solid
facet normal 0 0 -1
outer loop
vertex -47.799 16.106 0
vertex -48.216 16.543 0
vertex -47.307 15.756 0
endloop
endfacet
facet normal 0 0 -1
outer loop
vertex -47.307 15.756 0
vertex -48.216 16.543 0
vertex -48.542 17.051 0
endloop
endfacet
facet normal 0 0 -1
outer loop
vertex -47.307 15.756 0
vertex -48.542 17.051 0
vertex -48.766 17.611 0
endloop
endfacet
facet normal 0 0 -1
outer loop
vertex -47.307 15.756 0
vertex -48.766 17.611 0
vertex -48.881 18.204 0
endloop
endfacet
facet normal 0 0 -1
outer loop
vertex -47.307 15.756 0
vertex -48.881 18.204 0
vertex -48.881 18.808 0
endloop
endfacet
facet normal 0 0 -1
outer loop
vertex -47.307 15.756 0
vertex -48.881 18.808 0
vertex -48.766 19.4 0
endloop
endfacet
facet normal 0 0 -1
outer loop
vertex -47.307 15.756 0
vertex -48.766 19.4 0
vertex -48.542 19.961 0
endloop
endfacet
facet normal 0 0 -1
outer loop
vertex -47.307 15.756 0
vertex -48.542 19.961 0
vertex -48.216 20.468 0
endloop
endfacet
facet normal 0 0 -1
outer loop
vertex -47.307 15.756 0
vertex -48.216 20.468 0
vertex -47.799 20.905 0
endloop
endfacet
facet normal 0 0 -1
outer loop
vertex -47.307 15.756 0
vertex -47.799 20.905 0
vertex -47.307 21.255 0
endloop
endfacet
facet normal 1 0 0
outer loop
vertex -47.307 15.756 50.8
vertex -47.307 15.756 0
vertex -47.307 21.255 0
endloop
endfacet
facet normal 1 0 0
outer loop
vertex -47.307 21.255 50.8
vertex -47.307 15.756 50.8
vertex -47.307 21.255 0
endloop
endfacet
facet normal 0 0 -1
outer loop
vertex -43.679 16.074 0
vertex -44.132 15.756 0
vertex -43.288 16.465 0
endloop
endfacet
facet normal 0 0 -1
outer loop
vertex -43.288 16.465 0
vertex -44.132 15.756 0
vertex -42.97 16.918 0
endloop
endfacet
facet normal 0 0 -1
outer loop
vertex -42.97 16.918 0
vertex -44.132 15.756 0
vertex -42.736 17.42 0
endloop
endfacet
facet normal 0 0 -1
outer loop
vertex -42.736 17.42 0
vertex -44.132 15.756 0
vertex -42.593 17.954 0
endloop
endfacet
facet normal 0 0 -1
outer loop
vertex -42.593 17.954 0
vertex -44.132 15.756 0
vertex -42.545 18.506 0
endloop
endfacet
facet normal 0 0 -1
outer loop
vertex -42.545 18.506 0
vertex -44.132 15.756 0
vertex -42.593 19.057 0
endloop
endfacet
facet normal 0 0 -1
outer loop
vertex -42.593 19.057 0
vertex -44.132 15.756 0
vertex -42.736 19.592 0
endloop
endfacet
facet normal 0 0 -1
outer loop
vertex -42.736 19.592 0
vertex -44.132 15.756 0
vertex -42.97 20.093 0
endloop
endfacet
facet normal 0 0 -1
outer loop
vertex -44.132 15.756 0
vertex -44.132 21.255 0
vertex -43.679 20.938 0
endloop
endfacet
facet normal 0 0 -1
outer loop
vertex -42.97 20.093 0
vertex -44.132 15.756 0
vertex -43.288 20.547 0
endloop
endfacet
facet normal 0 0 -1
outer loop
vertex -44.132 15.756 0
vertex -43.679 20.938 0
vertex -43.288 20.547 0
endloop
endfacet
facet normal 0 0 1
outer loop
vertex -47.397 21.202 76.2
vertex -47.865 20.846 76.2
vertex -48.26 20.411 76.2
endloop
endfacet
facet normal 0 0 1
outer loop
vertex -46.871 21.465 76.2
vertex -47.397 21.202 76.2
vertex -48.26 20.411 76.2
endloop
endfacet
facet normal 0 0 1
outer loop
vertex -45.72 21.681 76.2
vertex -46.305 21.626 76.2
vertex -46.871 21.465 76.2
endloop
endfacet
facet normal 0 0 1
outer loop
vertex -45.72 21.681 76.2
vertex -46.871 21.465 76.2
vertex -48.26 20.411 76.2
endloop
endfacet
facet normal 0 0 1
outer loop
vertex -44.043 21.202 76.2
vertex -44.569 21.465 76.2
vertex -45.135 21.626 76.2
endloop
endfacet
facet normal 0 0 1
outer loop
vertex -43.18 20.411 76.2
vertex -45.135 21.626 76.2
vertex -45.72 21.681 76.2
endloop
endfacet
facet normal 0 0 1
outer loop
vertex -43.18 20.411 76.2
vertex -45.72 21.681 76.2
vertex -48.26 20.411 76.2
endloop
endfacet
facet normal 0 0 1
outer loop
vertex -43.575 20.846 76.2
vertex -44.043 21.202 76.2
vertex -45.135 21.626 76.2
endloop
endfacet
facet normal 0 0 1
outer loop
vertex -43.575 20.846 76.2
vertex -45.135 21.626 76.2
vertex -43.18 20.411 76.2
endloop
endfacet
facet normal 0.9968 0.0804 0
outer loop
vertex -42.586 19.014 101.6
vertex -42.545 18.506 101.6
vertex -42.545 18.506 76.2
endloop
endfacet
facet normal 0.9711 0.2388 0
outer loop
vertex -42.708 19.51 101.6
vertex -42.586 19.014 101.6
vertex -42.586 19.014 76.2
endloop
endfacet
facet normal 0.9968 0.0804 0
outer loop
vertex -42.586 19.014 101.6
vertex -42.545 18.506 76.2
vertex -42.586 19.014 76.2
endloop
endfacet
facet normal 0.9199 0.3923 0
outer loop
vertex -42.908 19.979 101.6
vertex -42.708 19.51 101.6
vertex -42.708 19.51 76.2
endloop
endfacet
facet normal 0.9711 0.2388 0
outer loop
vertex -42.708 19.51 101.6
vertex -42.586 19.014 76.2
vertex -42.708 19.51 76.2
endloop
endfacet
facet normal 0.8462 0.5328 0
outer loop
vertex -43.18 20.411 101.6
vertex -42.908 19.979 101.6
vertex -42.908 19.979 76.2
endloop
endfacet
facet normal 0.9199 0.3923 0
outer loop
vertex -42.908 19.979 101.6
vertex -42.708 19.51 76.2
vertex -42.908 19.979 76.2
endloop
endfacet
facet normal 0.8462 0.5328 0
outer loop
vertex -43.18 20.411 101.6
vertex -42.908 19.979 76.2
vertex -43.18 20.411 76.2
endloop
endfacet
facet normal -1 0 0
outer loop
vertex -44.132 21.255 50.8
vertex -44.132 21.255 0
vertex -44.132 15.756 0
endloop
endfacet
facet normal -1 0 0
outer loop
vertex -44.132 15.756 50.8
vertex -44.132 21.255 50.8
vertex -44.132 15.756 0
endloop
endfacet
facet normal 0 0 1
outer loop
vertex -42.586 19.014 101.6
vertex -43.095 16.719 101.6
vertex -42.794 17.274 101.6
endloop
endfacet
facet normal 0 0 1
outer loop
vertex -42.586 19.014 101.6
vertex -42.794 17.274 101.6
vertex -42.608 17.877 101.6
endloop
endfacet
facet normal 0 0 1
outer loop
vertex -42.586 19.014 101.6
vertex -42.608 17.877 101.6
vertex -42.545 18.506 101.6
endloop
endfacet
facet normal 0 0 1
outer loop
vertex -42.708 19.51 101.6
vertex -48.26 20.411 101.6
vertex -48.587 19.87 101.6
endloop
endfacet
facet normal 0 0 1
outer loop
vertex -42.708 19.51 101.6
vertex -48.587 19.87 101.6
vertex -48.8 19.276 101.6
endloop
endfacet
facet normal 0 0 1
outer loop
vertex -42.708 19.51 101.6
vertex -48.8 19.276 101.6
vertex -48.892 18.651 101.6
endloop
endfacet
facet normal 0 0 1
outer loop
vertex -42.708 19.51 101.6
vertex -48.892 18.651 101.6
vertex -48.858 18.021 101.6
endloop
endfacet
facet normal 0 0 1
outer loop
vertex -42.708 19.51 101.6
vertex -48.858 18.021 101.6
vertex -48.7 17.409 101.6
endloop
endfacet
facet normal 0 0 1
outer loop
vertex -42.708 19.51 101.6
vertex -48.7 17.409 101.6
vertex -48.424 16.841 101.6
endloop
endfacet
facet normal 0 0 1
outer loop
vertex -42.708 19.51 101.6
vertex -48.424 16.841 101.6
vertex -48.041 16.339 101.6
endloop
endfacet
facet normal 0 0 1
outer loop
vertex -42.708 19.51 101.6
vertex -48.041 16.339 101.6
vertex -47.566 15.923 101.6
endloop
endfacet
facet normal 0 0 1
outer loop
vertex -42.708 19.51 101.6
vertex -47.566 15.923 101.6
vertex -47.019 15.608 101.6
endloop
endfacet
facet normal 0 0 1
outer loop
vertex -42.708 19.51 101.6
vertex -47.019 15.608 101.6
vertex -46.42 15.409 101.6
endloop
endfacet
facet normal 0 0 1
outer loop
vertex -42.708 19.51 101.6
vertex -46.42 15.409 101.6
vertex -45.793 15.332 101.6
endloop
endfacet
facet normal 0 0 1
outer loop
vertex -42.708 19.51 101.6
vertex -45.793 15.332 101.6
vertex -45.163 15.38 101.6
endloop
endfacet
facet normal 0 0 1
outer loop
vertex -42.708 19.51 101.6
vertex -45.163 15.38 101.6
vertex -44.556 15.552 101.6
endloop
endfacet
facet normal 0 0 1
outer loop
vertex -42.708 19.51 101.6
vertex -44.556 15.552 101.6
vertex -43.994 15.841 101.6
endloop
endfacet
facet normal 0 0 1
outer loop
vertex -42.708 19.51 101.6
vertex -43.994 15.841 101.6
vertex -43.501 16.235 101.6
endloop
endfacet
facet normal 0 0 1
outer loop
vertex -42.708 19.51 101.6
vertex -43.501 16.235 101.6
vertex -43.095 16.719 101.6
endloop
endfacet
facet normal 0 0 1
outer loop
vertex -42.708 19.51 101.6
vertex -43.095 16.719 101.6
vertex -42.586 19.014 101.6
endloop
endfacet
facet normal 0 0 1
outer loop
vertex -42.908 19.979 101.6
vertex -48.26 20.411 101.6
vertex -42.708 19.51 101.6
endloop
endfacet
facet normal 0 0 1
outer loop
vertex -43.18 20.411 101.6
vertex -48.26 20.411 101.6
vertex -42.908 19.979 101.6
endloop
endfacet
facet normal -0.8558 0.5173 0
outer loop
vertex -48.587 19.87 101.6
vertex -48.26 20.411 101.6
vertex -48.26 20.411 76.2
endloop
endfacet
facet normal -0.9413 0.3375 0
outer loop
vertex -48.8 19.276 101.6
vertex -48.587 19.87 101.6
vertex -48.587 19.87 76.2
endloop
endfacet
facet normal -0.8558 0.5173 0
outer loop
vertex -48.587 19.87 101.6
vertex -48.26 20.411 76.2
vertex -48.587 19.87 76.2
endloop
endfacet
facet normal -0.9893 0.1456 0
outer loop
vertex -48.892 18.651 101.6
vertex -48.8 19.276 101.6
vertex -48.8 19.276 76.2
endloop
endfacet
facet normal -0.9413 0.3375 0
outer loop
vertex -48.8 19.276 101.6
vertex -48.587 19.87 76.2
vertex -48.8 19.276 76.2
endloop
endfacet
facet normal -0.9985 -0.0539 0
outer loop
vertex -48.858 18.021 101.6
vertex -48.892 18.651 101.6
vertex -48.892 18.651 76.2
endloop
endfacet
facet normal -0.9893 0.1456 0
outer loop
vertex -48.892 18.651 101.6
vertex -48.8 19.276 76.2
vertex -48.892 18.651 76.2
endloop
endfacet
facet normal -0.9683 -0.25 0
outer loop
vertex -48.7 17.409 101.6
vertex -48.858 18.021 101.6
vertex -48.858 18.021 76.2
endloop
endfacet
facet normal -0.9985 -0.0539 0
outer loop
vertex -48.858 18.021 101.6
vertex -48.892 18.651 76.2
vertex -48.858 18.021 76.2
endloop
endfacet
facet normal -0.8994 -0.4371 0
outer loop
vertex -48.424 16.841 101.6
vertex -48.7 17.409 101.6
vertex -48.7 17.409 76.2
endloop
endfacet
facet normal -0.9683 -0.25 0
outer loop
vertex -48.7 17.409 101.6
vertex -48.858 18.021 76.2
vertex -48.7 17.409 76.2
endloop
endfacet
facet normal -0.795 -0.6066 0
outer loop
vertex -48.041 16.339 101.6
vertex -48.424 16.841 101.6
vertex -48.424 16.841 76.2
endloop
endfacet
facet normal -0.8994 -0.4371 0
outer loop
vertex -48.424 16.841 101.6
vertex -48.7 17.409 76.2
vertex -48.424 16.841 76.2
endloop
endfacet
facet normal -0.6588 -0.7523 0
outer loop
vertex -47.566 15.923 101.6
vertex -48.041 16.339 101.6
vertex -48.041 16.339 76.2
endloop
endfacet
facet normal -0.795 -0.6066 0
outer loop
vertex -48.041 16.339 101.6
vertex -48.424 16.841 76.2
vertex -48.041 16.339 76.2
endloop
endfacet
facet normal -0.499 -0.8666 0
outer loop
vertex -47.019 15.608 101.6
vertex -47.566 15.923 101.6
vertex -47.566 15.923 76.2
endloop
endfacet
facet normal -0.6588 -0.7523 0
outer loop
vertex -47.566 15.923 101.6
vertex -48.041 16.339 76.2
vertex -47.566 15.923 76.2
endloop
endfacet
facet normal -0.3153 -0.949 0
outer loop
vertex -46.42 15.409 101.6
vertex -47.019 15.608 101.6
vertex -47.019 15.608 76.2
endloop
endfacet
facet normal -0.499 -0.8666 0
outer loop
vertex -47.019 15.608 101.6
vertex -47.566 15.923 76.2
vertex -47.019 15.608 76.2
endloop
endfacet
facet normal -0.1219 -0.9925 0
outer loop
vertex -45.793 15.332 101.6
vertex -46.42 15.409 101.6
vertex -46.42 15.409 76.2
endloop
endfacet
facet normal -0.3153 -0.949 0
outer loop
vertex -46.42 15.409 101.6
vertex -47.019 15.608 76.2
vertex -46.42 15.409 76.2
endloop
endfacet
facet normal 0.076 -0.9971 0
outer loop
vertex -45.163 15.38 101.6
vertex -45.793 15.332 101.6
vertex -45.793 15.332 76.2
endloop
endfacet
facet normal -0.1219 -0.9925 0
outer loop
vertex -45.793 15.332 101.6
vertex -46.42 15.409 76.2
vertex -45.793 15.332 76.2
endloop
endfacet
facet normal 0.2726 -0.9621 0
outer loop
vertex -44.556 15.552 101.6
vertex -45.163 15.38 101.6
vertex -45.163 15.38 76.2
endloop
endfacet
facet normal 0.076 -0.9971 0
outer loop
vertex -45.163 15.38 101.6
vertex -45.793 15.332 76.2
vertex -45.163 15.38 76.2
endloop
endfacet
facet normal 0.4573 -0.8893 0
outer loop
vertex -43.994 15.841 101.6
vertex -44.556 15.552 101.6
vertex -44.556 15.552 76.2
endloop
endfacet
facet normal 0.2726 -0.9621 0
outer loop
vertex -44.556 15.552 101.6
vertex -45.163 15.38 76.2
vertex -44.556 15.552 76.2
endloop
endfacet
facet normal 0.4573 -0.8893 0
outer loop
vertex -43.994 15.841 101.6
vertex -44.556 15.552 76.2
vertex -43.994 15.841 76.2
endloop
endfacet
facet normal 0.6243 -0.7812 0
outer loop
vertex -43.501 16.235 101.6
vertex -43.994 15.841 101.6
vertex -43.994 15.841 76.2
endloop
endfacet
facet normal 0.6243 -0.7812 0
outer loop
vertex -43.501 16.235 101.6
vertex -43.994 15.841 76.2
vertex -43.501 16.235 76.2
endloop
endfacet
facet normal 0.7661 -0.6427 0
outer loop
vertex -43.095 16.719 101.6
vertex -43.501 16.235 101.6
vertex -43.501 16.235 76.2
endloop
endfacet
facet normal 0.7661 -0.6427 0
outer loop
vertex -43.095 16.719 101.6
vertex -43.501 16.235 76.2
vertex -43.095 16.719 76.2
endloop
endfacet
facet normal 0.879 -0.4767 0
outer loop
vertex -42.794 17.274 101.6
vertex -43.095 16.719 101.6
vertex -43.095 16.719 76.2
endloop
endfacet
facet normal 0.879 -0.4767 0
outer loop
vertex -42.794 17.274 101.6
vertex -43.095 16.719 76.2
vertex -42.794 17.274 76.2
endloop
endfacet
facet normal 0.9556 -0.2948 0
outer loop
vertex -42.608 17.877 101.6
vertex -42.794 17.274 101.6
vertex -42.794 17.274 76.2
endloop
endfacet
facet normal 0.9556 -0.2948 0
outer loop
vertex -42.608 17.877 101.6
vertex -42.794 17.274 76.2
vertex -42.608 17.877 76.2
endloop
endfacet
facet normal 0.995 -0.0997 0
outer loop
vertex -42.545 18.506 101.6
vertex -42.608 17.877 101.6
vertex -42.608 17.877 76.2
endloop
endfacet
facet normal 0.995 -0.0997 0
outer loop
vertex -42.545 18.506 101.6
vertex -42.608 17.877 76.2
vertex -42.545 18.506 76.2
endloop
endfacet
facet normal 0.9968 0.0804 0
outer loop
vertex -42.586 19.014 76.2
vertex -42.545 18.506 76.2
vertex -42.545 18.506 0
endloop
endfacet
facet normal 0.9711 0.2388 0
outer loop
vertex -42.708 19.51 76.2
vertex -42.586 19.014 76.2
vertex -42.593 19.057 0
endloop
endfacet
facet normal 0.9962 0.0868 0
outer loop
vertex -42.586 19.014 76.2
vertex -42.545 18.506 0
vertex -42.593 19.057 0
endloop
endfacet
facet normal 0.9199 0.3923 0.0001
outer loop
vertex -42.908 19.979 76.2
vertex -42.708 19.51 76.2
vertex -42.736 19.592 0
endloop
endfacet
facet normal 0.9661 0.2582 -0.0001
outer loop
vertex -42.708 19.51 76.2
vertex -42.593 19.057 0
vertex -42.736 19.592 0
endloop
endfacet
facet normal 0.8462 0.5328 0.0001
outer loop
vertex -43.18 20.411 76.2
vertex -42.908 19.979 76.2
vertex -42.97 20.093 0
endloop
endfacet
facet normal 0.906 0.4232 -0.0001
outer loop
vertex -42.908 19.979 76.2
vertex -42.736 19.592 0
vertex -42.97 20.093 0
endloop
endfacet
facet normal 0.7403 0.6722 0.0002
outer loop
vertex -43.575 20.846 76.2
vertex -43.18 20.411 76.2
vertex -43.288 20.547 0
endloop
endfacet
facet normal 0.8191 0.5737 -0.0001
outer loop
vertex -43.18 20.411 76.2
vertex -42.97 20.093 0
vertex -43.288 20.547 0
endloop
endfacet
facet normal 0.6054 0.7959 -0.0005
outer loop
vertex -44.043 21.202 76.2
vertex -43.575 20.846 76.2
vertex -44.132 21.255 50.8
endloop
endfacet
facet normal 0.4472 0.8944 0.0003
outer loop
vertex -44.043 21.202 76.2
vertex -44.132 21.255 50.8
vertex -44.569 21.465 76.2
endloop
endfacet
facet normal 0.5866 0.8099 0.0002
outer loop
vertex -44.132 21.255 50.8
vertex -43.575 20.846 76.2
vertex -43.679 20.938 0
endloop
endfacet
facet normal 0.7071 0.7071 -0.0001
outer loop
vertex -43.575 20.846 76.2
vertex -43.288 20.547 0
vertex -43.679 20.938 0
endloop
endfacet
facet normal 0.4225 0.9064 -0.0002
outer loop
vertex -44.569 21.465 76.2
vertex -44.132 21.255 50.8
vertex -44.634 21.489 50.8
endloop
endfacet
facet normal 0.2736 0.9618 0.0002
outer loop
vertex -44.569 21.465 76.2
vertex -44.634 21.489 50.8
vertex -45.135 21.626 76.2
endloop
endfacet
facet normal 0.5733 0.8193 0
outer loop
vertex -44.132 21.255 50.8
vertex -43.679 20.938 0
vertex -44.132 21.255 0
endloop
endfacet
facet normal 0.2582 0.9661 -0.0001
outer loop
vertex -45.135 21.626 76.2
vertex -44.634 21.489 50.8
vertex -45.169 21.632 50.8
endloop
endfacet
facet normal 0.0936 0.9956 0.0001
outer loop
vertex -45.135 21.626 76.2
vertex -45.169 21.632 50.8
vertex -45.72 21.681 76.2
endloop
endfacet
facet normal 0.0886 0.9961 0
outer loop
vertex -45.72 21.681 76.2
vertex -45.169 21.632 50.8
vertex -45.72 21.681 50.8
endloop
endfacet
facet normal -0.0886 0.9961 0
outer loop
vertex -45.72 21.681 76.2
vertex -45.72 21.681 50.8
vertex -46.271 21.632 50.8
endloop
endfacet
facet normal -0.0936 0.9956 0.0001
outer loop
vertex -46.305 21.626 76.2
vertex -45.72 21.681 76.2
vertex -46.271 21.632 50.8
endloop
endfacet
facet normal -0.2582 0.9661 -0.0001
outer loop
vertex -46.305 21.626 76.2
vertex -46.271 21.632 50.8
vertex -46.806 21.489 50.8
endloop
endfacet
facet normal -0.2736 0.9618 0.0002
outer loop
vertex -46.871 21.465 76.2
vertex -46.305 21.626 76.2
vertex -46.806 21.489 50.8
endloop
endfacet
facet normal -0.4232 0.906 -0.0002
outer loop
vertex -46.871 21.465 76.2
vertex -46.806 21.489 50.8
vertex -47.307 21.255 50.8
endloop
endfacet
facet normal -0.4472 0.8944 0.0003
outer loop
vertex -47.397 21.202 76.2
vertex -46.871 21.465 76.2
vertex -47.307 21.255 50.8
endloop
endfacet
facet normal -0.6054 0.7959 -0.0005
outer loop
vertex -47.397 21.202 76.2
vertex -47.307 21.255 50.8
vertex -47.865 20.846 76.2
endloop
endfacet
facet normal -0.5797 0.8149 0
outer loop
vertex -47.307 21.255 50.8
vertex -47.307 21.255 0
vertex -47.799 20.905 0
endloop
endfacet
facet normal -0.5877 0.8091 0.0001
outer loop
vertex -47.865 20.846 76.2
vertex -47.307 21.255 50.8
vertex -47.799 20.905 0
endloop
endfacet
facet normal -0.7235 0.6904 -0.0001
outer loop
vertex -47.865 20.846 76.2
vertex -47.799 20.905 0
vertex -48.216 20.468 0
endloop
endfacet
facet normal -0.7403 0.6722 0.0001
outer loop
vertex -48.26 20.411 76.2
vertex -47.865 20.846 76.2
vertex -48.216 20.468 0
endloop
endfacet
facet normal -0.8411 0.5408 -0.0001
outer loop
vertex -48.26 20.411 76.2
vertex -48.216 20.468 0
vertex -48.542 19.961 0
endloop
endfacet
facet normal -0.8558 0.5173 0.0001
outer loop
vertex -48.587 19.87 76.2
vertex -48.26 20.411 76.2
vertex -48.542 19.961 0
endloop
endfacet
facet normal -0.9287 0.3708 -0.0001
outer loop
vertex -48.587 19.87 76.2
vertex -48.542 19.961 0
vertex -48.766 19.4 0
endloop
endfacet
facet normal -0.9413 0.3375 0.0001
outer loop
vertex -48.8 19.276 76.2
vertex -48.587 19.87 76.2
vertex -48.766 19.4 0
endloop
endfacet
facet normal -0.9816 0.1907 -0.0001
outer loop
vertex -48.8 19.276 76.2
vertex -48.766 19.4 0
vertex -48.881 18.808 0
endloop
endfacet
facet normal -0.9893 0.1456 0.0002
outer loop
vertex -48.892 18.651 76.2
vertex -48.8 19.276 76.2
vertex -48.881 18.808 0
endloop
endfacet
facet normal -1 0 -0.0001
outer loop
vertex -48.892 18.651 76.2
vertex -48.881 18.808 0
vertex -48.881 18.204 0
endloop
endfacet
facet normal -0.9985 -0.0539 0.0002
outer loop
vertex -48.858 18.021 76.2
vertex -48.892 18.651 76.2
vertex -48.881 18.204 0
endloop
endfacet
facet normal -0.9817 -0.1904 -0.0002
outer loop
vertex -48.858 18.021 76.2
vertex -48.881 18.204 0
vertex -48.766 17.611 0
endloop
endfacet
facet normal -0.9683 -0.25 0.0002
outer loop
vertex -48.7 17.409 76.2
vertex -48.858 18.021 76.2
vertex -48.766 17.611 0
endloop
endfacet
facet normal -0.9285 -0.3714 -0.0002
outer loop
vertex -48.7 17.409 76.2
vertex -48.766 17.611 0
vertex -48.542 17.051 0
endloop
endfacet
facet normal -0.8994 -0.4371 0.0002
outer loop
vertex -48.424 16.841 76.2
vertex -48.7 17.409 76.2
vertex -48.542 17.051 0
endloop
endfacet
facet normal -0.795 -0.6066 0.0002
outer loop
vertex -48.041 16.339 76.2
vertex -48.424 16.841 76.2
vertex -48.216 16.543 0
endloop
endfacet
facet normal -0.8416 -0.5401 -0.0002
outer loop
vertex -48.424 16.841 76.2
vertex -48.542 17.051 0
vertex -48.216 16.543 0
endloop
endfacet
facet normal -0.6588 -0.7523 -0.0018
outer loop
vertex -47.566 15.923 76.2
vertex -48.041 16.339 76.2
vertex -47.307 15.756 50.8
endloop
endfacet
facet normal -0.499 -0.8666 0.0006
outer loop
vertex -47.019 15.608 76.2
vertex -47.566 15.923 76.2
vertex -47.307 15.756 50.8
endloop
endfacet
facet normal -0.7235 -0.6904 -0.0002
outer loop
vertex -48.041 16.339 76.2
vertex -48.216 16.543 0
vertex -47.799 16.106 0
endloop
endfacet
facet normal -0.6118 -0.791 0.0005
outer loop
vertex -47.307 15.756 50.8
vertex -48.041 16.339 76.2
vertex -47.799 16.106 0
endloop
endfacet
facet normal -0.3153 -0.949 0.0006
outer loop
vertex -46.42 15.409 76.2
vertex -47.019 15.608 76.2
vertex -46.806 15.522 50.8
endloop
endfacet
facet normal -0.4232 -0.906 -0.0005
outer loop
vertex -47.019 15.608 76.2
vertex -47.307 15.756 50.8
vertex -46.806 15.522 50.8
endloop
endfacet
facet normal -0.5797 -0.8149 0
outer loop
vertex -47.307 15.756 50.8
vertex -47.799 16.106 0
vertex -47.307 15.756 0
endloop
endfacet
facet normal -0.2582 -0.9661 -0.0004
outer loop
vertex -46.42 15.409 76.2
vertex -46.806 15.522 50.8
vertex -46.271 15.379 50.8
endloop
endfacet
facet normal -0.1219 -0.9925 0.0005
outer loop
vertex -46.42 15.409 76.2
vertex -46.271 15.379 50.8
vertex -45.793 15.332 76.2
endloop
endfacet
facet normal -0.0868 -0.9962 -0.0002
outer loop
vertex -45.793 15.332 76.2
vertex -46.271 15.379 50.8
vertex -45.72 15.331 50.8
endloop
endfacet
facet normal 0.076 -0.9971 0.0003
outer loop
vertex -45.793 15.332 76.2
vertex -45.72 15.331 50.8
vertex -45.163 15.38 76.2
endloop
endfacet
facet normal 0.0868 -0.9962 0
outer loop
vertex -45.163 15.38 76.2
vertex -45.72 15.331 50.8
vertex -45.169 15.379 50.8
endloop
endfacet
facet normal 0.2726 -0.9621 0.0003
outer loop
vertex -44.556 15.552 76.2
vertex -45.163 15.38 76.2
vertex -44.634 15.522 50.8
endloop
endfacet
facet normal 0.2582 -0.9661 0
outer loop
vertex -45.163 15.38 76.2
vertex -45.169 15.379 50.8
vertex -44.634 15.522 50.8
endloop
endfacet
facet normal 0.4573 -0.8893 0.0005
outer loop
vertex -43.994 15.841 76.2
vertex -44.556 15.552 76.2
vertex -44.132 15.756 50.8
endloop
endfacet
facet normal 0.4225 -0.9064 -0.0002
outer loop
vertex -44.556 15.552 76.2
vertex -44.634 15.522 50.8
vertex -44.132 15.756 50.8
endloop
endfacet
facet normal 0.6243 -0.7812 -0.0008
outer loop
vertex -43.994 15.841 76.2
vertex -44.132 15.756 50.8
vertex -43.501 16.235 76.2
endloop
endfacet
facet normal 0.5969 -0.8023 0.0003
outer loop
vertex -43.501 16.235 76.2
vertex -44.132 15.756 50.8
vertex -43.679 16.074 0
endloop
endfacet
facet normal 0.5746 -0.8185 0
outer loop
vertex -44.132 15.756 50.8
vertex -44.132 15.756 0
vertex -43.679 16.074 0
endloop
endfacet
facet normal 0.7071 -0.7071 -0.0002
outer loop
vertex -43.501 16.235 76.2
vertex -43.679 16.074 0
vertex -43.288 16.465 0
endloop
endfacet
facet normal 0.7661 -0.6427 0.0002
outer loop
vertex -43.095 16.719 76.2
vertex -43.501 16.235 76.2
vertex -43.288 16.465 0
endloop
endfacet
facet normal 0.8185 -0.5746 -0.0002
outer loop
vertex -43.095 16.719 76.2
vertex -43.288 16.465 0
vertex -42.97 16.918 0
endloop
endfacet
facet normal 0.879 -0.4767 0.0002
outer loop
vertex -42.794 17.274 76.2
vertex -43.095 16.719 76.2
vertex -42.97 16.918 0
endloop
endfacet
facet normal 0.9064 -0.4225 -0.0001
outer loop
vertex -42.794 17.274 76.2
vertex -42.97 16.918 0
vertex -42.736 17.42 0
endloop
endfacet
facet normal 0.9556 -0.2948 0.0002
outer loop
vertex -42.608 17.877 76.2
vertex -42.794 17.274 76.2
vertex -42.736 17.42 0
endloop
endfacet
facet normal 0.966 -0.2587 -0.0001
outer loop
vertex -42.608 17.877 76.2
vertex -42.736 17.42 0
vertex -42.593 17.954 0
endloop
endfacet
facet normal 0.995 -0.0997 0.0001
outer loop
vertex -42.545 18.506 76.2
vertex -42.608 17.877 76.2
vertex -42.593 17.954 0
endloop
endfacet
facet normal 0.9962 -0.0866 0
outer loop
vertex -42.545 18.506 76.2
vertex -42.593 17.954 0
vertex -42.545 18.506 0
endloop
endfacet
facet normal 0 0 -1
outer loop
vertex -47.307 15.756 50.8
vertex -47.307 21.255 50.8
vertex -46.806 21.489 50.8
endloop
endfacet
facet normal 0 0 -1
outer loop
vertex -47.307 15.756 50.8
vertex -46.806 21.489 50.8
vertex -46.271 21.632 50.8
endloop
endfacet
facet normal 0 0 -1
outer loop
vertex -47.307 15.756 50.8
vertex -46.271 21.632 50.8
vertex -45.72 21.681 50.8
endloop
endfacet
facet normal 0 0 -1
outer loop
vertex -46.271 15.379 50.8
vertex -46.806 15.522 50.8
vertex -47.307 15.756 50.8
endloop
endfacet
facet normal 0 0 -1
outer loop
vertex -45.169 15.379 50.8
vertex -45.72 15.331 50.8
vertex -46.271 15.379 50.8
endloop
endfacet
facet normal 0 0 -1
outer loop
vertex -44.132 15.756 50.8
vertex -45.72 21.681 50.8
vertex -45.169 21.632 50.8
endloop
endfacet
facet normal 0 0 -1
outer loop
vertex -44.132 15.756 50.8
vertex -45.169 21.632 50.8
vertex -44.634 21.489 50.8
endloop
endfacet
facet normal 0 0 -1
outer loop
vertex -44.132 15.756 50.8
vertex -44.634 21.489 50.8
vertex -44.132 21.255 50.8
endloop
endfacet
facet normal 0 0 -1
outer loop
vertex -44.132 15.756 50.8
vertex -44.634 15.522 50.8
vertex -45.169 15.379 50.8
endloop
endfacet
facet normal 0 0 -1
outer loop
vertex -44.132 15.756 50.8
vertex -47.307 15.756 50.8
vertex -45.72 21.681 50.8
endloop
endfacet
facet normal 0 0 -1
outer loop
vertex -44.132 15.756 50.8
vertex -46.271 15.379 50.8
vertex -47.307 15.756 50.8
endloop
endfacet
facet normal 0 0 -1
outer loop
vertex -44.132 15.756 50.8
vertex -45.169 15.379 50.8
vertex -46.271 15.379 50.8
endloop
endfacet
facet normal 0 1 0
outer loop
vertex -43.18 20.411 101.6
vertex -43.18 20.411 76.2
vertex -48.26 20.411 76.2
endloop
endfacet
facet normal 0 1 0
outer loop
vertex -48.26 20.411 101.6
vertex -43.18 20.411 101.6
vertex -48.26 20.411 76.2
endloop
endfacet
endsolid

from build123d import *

# Parameters (mm, degrees)
F0_R     = 3.175
F1_DEPTH = 76.2
F3_DEPTH = 25.4
F5_DEPTH = 50.8


with BuildPart() as f1:
    # F0 (on Top) → F1 (new body)
    with BuildSketch(Plane.XY):
        with Locations((-45.71999982, 18.5057148337)):
            Circle(F0_R)
    extrude(amount=F1_DEPTH)

    # F2 (on face) → F3 (join)
    with BuildSketch(Plane.XY.offset(76.2)):
        with BuildLine():
            Line((-43.17999982, 20.4107148337), (-48.25999982, 20.4107148337))
            ThreePointArc((-48.25999982, 20.4107148337), (-46.7240229771, 15.4936453624), (-42.54499982, 18.5057148337))
            ThreePointArc((-42.54499982, 18.5057148337), (-42.7079303487, 19.5097379908), (-43.17999982, 20.4107148337))
        make_face()
    extrude(amount=F3_DEPTH)

    # F4 (on face) → F5 (cut)
    with BuildSketch(Plane(origin=(0, 0, 0), x_dir=(1, 0, 0), z_dir=(0, 0, -1))):
        with BuildLine():
            Line((-47.30749982, -15.7560841767), (-47.30749982, -21.2553454908))
            ThreePointArc((-47.30749982, -21.2553454908), (-45.71999982, -21.6807148337), (-44.13249982, -21.2553454908))
            Line((-44.13249982, -21.2553454908), (-44.13249982, -15.7560841767))
            ThreePointArc((-44.13249982, -15.7560841767), (-45.71999982, -15.3307148337), (-47.30749982, -15.7560841767))
        make_face()
    extrude(amount=-F5_DEPTH, mode=Mode.SUBTRACT)


solid = f1.part
